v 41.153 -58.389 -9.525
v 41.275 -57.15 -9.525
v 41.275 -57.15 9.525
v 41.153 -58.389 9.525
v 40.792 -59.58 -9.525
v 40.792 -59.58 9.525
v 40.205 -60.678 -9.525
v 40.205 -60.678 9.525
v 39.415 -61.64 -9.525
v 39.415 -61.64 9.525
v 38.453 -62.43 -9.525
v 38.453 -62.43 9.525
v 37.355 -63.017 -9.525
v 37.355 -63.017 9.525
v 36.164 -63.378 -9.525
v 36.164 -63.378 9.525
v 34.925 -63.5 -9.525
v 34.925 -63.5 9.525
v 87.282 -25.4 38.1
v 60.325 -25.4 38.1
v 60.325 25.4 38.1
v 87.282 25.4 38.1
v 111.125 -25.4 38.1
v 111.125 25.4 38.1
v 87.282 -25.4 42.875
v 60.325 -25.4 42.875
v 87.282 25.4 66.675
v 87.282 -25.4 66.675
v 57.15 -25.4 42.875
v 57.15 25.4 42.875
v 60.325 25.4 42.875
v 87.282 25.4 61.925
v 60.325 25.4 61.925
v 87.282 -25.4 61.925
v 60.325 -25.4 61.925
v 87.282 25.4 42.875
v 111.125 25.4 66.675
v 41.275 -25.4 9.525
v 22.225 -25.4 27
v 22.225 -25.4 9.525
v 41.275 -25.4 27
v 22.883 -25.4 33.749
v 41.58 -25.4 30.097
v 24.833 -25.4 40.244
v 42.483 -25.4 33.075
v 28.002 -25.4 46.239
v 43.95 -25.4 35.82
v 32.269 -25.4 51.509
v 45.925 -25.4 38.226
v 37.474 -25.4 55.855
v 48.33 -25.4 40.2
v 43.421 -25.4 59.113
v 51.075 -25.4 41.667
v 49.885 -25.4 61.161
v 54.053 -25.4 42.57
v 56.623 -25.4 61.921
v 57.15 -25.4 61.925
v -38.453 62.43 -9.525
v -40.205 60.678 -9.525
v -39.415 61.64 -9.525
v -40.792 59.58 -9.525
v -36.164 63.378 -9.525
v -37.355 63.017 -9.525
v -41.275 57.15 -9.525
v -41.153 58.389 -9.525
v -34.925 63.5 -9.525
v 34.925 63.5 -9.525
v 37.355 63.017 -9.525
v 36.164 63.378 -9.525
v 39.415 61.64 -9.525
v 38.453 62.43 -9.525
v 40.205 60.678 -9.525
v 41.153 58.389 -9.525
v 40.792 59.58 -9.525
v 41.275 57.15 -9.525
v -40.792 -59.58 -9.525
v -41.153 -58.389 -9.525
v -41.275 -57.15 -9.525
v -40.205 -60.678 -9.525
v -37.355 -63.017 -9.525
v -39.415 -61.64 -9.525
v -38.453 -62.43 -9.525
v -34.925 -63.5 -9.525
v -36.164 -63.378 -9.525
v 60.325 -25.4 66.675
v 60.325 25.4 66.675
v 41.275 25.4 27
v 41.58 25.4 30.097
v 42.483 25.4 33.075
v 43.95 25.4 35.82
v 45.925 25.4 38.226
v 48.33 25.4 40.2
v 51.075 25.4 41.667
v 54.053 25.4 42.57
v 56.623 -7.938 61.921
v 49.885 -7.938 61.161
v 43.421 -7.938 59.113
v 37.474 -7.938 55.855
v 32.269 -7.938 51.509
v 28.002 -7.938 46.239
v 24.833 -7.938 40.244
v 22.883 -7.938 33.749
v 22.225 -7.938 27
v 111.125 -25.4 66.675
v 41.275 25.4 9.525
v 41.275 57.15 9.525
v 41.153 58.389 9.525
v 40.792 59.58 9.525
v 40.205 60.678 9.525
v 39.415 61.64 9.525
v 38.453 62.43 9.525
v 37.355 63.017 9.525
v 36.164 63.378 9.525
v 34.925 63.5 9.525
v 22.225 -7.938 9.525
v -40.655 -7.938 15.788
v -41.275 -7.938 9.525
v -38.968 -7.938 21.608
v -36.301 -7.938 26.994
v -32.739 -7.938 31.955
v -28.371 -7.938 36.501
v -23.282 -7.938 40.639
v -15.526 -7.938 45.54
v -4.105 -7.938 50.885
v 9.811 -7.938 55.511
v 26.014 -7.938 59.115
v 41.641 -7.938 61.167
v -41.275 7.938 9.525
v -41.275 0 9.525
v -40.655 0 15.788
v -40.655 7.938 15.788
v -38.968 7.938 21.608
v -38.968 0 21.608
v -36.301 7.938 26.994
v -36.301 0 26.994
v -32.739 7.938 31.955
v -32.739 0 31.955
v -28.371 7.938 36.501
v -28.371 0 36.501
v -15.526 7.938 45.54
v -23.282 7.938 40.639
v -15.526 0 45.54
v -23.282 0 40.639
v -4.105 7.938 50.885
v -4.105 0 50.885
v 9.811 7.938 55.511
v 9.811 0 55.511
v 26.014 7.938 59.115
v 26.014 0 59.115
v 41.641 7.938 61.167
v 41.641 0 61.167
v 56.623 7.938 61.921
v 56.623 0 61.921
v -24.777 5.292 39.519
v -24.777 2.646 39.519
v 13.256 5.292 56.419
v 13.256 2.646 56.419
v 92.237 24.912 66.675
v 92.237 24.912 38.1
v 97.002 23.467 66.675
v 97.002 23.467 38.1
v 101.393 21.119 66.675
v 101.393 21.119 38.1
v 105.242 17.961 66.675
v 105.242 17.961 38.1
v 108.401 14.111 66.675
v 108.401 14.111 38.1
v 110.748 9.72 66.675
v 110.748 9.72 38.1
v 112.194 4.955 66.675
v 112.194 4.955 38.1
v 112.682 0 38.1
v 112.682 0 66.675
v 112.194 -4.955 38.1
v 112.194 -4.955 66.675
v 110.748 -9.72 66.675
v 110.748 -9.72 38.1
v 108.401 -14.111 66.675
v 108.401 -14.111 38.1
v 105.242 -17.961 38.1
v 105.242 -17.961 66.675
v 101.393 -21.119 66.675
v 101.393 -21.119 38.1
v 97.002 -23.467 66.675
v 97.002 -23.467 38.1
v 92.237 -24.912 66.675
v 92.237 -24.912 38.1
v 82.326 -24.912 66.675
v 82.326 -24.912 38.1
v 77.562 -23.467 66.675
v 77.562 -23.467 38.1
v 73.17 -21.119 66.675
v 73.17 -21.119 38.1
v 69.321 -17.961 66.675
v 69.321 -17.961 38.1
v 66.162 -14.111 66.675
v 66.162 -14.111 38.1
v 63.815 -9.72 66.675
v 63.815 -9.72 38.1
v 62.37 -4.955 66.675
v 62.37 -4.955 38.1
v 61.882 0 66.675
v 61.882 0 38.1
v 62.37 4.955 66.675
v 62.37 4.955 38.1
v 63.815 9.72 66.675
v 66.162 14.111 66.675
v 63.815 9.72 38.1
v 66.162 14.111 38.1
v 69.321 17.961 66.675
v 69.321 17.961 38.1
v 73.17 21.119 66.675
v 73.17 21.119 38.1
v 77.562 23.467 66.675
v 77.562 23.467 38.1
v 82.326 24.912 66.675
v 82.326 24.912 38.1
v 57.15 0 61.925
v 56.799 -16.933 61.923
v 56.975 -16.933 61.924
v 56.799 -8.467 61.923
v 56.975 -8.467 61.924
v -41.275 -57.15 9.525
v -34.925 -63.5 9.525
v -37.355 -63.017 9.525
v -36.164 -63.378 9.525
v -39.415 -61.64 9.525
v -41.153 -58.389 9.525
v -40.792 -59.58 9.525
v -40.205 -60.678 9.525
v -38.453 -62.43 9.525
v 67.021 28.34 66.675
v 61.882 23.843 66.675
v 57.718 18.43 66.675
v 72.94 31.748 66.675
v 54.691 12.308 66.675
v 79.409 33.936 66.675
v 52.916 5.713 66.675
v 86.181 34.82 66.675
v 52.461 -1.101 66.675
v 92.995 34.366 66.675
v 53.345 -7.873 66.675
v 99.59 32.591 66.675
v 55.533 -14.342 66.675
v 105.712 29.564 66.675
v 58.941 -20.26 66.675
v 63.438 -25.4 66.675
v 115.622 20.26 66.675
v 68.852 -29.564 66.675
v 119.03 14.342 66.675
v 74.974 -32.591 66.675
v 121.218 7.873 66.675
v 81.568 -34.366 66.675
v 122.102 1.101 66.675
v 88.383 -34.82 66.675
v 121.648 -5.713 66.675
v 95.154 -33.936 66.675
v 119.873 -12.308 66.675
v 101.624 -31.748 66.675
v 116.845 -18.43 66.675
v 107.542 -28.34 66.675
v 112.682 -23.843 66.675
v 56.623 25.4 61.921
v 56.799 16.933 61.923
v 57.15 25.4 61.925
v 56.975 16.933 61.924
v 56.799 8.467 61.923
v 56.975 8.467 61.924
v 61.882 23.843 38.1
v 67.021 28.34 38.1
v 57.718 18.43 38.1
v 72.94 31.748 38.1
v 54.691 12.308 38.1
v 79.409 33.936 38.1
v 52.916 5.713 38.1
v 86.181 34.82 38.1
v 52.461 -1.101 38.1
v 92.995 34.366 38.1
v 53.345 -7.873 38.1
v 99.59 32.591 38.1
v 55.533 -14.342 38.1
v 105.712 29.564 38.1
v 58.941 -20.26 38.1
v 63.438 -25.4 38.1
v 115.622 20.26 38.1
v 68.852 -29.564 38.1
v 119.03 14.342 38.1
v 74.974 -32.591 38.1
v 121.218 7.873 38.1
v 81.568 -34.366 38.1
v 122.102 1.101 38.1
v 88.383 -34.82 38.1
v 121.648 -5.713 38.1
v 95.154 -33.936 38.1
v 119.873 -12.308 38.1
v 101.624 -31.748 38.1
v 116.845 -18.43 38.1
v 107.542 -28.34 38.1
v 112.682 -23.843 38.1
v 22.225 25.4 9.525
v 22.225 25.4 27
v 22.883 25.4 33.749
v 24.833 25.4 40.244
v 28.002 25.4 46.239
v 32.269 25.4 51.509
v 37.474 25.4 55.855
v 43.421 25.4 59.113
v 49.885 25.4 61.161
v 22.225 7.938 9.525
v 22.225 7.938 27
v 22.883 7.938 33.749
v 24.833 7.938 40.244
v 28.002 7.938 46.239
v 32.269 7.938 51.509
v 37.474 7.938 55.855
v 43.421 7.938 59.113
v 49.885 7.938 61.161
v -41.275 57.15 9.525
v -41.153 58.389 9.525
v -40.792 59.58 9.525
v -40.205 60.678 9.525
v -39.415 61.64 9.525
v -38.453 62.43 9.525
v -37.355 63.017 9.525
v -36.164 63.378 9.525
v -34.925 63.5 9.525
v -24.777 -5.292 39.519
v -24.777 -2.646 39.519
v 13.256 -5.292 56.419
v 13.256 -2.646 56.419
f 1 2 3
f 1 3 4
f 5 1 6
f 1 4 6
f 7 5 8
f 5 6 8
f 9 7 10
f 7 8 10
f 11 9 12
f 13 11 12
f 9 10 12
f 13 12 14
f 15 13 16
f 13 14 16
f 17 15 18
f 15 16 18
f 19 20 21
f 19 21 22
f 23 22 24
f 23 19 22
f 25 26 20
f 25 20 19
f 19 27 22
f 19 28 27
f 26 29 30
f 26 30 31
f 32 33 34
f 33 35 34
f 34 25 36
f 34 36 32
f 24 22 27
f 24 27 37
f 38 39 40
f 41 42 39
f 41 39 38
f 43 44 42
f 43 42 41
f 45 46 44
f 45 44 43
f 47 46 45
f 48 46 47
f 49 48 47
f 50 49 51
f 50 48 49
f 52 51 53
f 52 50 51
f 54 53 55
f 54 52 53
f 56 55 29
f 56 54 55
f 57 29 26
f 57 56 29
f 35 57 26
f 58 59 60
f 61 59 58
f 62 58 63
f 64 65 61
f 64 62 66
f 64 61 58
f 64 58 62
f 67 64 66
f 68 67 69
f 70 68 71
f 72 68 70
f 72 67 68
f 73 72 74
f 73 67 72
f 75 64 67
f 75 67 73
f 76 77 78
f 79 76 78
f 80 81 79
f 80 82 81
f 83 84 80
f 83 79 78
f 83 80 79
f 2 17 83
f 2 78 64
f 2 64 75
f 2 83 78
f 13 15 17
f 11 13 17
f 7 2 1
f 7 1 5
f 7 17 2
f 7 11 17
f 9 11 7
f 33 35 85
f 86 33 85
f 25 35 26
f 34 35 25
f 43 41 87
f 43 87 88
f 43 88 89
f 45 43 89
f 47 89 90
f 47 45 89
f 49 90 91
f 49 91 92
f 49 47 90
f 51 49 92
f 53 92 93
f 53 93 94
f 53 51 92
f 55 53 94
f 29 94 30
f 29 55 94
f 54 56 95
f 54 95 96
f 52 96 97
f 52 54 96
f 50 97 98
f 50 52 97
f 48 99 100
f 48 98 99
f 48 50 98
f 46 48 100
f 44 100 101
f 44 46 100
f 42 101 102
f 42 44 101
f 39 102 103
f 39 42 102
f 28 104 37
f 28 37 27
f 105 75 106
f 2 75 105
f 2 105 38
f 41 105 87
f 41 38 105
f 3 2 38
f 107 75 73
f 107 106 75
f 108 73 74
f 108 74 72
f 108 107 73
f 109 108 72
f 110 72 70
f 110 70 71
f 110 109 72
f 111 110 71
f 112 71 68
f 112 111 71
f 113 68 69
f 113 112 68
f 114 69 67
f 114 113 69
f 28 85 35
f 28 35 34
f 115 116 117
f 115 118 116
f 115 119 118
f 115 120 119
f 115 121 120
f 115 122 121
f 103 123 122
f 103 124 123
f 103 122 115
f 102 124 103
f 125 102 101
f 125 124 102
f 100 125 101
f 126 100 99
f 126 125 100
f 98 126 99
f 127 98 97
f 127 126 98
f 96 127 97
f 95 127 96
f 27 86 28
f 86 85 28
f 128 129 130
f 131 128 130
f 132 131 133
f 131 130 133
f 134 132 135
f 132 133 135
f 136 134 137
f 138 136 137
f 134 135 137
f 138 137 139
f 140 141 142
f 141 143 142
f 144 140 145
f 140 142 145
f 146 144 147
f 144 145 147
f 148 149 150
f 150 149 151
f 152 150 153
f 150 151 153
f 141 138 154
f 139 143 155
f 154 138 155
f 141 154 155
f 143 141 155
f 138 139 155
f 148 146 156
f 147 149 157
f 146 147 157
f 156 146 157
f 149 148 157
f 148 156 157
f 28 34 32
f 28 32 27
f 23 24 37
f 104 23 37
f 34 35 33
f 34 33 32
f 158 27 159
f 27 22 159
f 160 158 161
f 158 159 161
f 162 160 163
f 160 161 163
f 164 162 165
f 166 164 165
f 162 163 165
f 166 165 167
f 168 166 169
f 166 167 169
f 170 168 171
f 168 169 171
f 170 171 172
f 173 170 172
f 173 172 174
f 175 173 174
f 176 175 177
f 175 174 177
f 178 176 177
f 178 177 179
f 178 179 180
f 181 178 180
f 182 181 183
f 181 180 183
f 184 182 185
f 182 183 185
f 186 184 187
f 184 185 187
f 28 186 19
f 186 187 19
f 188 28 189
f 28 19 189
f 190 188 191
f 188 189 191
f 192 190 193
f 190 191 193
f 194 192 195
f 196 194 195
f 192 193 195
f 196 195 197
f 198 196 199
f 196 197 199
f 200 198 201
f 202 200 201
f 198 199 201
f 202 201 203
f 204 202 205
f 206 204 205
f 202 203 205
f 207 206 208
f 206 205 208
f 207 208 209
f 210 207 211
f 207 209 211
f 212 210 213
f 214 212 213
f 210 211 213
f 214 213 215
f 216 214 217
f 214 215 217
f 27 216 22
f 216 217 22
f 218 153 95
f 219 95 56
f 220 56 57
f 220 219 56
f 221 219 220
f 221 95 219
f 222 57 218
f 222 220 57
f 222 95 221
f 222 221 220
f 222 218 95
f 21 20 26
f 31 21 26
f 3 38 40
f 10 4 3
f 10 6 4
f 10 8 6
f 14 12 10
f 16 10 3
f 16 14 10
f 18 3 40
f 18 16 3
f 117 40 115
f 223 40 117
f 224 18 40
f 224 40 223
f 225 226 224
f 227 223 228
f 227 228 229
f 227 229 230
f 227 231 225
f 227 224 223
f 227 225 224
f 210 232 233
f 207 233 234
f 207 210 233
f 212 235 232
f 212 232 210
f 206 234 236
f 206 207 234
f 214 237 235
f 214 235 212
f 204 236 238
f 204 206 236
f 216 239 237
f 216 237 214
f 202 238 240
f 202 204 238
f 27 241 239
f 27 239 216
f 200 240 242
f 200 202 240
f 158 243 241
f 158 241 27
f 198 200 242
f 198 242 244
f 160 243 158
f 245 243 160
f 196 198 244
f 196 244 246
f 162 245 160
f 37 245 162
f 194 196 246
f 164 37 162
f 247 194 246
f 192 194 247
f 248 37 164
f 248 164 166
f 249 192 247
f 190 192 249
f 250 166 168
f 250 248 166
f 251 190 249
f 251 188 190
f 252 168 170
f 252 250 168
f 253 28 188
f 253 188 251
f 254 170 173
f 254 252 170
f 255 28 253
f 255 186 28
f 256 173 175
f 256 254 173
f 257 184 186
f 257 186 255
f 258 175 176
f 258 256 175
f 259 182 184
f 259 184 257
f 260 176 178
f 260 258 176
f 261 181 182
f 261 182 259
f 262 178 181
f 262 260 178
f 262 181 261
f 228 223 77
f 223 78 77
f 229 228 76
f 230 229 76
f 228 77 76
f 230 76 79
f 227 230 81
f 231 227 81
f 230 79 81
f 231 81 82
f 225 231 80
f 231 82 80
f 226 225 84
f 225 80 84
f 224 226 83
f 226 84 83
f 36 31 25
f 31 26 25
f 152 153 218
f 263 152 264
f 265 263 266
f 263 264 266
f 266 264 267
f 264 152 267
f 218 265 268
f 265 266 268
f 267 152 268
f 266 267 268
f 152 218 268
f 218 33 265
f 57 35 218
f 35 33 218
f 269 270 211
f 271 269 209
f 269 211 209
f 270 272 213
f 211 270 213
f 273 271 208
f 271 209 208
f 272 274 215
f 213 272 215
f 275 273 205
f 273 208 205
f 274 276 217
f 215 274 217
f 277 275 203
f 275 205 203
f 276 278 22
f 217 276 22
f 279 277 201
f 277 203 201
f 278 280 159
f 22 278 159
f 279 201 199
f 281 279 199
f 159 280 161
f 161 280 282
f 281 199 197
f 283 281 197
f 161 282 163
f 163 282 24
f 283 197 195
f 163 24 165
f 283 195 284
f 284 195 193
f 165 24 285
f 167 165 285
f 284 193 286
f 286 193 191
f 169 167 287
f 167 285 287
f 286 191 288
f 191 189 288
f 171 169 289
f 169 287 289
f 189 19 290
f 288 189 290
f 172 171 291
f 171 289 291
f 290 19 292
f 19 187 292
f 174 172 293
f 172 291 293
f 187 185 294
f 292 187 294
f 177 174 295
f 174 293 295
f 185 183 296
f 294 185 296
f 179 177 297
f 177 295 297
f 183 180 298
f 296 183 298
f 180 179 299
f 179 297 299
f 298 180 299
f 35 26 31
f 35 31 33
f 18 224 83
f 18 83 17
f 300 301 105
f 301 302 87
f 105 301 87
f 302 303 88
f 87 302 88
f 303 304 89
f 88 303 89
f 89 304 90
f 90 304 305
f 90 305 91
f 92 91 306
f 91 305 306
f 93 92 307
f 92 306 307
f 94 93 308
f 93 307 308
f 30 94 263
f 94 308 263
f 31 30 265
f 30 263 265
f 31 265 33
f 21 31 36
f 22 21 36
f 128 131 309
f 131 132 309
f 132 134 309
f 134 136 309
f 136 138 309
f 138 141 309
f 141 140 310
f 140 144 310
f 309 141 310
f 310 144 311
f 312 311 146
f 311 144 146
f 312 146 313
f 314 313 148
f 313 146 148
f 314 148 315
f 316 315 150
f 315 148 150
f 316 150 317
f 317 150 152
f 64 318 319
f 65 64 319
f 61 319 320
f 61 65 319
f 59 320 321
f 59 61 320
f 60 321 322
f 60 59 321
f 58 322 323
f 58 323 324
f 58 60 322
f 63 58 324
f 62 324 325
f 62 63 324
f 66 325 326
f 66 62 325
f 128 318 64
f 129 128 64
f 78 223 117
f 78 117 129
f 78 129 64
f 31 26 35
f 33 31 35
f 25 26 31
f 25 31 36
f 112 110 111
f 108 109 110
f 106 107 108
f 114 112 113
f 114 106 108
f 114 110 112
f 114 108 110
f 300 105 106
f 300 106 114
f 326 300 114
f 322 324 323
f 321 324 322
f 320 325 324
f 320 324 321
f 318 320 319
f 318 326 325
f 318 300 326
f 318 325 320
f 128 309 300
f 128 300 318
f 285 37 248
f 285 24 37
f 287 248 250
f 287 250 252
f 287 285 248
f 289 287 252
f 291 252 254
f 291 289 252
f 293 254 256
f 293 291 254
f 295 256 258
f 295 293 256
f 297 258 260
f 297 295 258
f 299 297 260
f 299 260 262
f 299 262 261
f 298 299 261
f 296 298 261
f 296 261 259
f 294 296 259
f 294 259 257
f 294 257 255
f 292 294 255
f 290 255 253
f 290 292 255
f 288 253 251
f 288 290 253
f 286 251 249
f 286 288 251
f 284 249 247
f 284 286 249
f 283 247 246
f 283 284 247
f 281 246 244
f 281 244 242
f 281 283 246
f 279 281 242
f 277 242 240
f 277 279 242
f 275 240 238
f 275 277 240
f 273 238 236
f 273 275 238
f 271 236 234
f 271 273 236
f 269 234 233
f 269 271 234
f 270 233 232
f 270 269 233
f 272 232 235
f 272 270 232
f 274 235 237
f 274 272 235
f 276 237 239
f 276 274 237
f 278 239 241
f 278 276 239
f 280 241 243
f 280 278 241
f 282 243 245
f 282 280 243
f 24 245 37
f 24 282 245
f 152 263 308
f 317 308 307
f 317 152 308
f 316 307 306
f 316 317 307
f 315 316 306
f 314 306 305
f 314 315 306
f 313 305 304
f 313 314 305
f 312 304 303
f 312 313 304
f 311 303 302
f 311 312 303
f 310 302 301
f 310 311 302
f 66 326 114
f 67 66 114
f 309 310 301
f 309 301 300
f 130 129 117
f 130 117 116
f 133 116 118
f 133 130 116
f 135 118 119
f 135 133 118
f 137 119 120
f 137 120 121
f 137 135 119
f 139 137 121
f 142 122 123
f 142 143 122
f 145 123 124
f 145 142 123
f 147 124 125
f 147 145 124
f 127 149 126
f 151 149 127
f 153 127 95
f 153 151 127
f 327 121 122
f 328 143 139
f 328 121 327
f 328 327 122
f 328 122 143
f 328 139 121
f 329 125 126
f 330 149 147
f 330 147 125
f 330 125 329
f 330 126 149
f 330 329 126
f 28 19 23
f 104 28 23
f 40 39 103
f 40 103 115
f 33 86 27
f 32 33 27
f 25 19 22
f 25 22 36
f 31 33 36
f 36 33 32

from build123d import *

# Parameters (mm, degrees)
F1_DEPTH  = 63.5
F2_DEPTH  = 7.9375
F3_DEPTH  = 25.4
F0_W      = 26.9567337507
F0_H      = 4.7498
F4_DEPTH  = 25.4
F0_H_2    = 4.7752
F5_DEPTH  = 25.4
F0_H_3    = 19.05
F6_DEPTH  = 25.4
F7_DEPTH  = 25.4
F7_FACE_W = 23.8432662493
F7_FACE_H = 28.575
F9_R      = 6.35


with BuildPart() as f1:
    # F0 (on Front) → F1 (new body, symmetric)
    with BuildSketch(Plane.XZ):
        Polygon((41.275, -9.525), (41.275, 9.525), (22.225, 9.525), (-41.275, 9.525), (-41.275, -9.525), align=None)
    extrude(amount=F1_DEPTH, both=True)

    # F0 (on Front) → F2 (join, symmetric)
    with BuildSketch(Plane.XZ):
        with BuildLine():
            Line((-41.275, 9.525), (22.225, 9.525))
            Line((22.225, 9.525), (22.225, 27.0002))
            ThreePointArc((22.225, 27.0002), (32.2687691693, 51.508973477), (56.6232807358, 61.9212279318))
            add(Edge.make_bspline(
                [(-41.275, 9.525), (-40.9449543221, 46.6319803824), (15.9898114656, 61.5524020782), (56.6232807358, 61.9212279318)],
                knots=[0, 0, 0, 0, 111.0239729905, 111.0239729905, 111.0239729905, 111.0239729905], degree=3))
        make_face()
    extrude(amount=F2_DEPTH, both=True)

    # F0 (on Front) → F3 (join, symmetric)
    with BuildSketch(Plane.XZ):
        with BuildLine():
            Line((22.225, 9.525), (41.275, 9.525))
            Line((41.275, 9.525), (41.275, 27.0002))
            ThreePointArc((41.275, 27.0002), (45.9246798487, 38.2255201513), (57.15, 42.8752))
            Line((57.15, 42.8752), (60.325, 42.8752))
            Line((60.325, 42.8752), (60.325, 61.9252))
            Line((60.325, 61.9252), (57.15, 61.9252))
            add(Edge.make_bspline(
                [(56.6232807358, 61.9212279318), (56.7991612091, 61.922824381), (56.974736268, 61.9241481973), (57.15, 61.9252)],
                knots=[111.0239729905, 111.0239729905, 111.0239729905, 111.0239729905, 111.5045361635, 111.5045361635, 111.5045361635, 111.5045361635], degree=3))
            ThreePointArc((56.6232807358, 61.9212279318), (32.2687691693, 51.508973477), (22.225, 27.0002))
            Line((22.225, 27.0002), (22.225, 9.525))
        make_face()
    extrude(amount=F3_DEPTH, both=True)

    # F9
    f9_edges = [f1.edges().sort_by_distance(p)[0] for p in [
        (41.275, -63.5, 0),
        (41.275, 63.5, 0),
        (-41.275, -63.5, 0),
        (-41.275, 63.5, 0),
    ]]
    fillet(f9_edges, radius=F9_R)


with BuildPart() as f4:
    # F0 (on Front) → F4 (new body, symmetric)
    with BuildSketch(Plane.XZ):
        with Locations((73.8033668753, 64.3001)):
            Rectangle(F0_W, F0_H)
    extrude(amount=F4_DEPTH, both=True)


with BuildPart() as f5:
    # F0 (on Front) → F5 (new body, symmetric)
    with BuildSketch(Plane.XZ):
        with Locations((73.8033668753, 40.4876)):
            Rectangle(F0_W, F0_H_2)
    extrude(amount=F5_DEPTH, both=True)


with BuildPart() as f6:
    # F0 (on Front) → F6 (new body, symmetric)
    with BuildSketch(Plane.XZ):
        with Locations((73.8033668753, 52.4002)):
            Rectangle(F0_W, F0_H_3)
    extrude(amount=F6_DEPTH, both=True)


with BuildPart() as f7:
    # F0 (on Front) → F7 (new body, symmetric)
    with BuildSketch(Plane.XZ):
        Polygon((87.2817337507, 61.9252), (87.2817337507, 42.8752), (87.2817337507, 38.1), (111.125, 38.1), (111.125, 66.675), (87.2817337507, 66.675), align=None)
    extrude(amount=F7_DEPTH, both=True)


with BuildPart() as f8:
    # F7_face (on face) → F8 (revolve)
    with BuildSketch(Plane(origin=(99.2033668753, 25.4, 52.3875), x_dir=(1, 0, 0), z_dir=(0, 1, 0))):
        Rectangle(F7_FACE_W, F7_FACE_H)
    revolve(axis=Axis((87.2817337507, 0, 52.3875), (0, 0, -1)))


solid = Compound([f1.part, f4.part, f5.part, f6.part, f7.part, f8.part])
